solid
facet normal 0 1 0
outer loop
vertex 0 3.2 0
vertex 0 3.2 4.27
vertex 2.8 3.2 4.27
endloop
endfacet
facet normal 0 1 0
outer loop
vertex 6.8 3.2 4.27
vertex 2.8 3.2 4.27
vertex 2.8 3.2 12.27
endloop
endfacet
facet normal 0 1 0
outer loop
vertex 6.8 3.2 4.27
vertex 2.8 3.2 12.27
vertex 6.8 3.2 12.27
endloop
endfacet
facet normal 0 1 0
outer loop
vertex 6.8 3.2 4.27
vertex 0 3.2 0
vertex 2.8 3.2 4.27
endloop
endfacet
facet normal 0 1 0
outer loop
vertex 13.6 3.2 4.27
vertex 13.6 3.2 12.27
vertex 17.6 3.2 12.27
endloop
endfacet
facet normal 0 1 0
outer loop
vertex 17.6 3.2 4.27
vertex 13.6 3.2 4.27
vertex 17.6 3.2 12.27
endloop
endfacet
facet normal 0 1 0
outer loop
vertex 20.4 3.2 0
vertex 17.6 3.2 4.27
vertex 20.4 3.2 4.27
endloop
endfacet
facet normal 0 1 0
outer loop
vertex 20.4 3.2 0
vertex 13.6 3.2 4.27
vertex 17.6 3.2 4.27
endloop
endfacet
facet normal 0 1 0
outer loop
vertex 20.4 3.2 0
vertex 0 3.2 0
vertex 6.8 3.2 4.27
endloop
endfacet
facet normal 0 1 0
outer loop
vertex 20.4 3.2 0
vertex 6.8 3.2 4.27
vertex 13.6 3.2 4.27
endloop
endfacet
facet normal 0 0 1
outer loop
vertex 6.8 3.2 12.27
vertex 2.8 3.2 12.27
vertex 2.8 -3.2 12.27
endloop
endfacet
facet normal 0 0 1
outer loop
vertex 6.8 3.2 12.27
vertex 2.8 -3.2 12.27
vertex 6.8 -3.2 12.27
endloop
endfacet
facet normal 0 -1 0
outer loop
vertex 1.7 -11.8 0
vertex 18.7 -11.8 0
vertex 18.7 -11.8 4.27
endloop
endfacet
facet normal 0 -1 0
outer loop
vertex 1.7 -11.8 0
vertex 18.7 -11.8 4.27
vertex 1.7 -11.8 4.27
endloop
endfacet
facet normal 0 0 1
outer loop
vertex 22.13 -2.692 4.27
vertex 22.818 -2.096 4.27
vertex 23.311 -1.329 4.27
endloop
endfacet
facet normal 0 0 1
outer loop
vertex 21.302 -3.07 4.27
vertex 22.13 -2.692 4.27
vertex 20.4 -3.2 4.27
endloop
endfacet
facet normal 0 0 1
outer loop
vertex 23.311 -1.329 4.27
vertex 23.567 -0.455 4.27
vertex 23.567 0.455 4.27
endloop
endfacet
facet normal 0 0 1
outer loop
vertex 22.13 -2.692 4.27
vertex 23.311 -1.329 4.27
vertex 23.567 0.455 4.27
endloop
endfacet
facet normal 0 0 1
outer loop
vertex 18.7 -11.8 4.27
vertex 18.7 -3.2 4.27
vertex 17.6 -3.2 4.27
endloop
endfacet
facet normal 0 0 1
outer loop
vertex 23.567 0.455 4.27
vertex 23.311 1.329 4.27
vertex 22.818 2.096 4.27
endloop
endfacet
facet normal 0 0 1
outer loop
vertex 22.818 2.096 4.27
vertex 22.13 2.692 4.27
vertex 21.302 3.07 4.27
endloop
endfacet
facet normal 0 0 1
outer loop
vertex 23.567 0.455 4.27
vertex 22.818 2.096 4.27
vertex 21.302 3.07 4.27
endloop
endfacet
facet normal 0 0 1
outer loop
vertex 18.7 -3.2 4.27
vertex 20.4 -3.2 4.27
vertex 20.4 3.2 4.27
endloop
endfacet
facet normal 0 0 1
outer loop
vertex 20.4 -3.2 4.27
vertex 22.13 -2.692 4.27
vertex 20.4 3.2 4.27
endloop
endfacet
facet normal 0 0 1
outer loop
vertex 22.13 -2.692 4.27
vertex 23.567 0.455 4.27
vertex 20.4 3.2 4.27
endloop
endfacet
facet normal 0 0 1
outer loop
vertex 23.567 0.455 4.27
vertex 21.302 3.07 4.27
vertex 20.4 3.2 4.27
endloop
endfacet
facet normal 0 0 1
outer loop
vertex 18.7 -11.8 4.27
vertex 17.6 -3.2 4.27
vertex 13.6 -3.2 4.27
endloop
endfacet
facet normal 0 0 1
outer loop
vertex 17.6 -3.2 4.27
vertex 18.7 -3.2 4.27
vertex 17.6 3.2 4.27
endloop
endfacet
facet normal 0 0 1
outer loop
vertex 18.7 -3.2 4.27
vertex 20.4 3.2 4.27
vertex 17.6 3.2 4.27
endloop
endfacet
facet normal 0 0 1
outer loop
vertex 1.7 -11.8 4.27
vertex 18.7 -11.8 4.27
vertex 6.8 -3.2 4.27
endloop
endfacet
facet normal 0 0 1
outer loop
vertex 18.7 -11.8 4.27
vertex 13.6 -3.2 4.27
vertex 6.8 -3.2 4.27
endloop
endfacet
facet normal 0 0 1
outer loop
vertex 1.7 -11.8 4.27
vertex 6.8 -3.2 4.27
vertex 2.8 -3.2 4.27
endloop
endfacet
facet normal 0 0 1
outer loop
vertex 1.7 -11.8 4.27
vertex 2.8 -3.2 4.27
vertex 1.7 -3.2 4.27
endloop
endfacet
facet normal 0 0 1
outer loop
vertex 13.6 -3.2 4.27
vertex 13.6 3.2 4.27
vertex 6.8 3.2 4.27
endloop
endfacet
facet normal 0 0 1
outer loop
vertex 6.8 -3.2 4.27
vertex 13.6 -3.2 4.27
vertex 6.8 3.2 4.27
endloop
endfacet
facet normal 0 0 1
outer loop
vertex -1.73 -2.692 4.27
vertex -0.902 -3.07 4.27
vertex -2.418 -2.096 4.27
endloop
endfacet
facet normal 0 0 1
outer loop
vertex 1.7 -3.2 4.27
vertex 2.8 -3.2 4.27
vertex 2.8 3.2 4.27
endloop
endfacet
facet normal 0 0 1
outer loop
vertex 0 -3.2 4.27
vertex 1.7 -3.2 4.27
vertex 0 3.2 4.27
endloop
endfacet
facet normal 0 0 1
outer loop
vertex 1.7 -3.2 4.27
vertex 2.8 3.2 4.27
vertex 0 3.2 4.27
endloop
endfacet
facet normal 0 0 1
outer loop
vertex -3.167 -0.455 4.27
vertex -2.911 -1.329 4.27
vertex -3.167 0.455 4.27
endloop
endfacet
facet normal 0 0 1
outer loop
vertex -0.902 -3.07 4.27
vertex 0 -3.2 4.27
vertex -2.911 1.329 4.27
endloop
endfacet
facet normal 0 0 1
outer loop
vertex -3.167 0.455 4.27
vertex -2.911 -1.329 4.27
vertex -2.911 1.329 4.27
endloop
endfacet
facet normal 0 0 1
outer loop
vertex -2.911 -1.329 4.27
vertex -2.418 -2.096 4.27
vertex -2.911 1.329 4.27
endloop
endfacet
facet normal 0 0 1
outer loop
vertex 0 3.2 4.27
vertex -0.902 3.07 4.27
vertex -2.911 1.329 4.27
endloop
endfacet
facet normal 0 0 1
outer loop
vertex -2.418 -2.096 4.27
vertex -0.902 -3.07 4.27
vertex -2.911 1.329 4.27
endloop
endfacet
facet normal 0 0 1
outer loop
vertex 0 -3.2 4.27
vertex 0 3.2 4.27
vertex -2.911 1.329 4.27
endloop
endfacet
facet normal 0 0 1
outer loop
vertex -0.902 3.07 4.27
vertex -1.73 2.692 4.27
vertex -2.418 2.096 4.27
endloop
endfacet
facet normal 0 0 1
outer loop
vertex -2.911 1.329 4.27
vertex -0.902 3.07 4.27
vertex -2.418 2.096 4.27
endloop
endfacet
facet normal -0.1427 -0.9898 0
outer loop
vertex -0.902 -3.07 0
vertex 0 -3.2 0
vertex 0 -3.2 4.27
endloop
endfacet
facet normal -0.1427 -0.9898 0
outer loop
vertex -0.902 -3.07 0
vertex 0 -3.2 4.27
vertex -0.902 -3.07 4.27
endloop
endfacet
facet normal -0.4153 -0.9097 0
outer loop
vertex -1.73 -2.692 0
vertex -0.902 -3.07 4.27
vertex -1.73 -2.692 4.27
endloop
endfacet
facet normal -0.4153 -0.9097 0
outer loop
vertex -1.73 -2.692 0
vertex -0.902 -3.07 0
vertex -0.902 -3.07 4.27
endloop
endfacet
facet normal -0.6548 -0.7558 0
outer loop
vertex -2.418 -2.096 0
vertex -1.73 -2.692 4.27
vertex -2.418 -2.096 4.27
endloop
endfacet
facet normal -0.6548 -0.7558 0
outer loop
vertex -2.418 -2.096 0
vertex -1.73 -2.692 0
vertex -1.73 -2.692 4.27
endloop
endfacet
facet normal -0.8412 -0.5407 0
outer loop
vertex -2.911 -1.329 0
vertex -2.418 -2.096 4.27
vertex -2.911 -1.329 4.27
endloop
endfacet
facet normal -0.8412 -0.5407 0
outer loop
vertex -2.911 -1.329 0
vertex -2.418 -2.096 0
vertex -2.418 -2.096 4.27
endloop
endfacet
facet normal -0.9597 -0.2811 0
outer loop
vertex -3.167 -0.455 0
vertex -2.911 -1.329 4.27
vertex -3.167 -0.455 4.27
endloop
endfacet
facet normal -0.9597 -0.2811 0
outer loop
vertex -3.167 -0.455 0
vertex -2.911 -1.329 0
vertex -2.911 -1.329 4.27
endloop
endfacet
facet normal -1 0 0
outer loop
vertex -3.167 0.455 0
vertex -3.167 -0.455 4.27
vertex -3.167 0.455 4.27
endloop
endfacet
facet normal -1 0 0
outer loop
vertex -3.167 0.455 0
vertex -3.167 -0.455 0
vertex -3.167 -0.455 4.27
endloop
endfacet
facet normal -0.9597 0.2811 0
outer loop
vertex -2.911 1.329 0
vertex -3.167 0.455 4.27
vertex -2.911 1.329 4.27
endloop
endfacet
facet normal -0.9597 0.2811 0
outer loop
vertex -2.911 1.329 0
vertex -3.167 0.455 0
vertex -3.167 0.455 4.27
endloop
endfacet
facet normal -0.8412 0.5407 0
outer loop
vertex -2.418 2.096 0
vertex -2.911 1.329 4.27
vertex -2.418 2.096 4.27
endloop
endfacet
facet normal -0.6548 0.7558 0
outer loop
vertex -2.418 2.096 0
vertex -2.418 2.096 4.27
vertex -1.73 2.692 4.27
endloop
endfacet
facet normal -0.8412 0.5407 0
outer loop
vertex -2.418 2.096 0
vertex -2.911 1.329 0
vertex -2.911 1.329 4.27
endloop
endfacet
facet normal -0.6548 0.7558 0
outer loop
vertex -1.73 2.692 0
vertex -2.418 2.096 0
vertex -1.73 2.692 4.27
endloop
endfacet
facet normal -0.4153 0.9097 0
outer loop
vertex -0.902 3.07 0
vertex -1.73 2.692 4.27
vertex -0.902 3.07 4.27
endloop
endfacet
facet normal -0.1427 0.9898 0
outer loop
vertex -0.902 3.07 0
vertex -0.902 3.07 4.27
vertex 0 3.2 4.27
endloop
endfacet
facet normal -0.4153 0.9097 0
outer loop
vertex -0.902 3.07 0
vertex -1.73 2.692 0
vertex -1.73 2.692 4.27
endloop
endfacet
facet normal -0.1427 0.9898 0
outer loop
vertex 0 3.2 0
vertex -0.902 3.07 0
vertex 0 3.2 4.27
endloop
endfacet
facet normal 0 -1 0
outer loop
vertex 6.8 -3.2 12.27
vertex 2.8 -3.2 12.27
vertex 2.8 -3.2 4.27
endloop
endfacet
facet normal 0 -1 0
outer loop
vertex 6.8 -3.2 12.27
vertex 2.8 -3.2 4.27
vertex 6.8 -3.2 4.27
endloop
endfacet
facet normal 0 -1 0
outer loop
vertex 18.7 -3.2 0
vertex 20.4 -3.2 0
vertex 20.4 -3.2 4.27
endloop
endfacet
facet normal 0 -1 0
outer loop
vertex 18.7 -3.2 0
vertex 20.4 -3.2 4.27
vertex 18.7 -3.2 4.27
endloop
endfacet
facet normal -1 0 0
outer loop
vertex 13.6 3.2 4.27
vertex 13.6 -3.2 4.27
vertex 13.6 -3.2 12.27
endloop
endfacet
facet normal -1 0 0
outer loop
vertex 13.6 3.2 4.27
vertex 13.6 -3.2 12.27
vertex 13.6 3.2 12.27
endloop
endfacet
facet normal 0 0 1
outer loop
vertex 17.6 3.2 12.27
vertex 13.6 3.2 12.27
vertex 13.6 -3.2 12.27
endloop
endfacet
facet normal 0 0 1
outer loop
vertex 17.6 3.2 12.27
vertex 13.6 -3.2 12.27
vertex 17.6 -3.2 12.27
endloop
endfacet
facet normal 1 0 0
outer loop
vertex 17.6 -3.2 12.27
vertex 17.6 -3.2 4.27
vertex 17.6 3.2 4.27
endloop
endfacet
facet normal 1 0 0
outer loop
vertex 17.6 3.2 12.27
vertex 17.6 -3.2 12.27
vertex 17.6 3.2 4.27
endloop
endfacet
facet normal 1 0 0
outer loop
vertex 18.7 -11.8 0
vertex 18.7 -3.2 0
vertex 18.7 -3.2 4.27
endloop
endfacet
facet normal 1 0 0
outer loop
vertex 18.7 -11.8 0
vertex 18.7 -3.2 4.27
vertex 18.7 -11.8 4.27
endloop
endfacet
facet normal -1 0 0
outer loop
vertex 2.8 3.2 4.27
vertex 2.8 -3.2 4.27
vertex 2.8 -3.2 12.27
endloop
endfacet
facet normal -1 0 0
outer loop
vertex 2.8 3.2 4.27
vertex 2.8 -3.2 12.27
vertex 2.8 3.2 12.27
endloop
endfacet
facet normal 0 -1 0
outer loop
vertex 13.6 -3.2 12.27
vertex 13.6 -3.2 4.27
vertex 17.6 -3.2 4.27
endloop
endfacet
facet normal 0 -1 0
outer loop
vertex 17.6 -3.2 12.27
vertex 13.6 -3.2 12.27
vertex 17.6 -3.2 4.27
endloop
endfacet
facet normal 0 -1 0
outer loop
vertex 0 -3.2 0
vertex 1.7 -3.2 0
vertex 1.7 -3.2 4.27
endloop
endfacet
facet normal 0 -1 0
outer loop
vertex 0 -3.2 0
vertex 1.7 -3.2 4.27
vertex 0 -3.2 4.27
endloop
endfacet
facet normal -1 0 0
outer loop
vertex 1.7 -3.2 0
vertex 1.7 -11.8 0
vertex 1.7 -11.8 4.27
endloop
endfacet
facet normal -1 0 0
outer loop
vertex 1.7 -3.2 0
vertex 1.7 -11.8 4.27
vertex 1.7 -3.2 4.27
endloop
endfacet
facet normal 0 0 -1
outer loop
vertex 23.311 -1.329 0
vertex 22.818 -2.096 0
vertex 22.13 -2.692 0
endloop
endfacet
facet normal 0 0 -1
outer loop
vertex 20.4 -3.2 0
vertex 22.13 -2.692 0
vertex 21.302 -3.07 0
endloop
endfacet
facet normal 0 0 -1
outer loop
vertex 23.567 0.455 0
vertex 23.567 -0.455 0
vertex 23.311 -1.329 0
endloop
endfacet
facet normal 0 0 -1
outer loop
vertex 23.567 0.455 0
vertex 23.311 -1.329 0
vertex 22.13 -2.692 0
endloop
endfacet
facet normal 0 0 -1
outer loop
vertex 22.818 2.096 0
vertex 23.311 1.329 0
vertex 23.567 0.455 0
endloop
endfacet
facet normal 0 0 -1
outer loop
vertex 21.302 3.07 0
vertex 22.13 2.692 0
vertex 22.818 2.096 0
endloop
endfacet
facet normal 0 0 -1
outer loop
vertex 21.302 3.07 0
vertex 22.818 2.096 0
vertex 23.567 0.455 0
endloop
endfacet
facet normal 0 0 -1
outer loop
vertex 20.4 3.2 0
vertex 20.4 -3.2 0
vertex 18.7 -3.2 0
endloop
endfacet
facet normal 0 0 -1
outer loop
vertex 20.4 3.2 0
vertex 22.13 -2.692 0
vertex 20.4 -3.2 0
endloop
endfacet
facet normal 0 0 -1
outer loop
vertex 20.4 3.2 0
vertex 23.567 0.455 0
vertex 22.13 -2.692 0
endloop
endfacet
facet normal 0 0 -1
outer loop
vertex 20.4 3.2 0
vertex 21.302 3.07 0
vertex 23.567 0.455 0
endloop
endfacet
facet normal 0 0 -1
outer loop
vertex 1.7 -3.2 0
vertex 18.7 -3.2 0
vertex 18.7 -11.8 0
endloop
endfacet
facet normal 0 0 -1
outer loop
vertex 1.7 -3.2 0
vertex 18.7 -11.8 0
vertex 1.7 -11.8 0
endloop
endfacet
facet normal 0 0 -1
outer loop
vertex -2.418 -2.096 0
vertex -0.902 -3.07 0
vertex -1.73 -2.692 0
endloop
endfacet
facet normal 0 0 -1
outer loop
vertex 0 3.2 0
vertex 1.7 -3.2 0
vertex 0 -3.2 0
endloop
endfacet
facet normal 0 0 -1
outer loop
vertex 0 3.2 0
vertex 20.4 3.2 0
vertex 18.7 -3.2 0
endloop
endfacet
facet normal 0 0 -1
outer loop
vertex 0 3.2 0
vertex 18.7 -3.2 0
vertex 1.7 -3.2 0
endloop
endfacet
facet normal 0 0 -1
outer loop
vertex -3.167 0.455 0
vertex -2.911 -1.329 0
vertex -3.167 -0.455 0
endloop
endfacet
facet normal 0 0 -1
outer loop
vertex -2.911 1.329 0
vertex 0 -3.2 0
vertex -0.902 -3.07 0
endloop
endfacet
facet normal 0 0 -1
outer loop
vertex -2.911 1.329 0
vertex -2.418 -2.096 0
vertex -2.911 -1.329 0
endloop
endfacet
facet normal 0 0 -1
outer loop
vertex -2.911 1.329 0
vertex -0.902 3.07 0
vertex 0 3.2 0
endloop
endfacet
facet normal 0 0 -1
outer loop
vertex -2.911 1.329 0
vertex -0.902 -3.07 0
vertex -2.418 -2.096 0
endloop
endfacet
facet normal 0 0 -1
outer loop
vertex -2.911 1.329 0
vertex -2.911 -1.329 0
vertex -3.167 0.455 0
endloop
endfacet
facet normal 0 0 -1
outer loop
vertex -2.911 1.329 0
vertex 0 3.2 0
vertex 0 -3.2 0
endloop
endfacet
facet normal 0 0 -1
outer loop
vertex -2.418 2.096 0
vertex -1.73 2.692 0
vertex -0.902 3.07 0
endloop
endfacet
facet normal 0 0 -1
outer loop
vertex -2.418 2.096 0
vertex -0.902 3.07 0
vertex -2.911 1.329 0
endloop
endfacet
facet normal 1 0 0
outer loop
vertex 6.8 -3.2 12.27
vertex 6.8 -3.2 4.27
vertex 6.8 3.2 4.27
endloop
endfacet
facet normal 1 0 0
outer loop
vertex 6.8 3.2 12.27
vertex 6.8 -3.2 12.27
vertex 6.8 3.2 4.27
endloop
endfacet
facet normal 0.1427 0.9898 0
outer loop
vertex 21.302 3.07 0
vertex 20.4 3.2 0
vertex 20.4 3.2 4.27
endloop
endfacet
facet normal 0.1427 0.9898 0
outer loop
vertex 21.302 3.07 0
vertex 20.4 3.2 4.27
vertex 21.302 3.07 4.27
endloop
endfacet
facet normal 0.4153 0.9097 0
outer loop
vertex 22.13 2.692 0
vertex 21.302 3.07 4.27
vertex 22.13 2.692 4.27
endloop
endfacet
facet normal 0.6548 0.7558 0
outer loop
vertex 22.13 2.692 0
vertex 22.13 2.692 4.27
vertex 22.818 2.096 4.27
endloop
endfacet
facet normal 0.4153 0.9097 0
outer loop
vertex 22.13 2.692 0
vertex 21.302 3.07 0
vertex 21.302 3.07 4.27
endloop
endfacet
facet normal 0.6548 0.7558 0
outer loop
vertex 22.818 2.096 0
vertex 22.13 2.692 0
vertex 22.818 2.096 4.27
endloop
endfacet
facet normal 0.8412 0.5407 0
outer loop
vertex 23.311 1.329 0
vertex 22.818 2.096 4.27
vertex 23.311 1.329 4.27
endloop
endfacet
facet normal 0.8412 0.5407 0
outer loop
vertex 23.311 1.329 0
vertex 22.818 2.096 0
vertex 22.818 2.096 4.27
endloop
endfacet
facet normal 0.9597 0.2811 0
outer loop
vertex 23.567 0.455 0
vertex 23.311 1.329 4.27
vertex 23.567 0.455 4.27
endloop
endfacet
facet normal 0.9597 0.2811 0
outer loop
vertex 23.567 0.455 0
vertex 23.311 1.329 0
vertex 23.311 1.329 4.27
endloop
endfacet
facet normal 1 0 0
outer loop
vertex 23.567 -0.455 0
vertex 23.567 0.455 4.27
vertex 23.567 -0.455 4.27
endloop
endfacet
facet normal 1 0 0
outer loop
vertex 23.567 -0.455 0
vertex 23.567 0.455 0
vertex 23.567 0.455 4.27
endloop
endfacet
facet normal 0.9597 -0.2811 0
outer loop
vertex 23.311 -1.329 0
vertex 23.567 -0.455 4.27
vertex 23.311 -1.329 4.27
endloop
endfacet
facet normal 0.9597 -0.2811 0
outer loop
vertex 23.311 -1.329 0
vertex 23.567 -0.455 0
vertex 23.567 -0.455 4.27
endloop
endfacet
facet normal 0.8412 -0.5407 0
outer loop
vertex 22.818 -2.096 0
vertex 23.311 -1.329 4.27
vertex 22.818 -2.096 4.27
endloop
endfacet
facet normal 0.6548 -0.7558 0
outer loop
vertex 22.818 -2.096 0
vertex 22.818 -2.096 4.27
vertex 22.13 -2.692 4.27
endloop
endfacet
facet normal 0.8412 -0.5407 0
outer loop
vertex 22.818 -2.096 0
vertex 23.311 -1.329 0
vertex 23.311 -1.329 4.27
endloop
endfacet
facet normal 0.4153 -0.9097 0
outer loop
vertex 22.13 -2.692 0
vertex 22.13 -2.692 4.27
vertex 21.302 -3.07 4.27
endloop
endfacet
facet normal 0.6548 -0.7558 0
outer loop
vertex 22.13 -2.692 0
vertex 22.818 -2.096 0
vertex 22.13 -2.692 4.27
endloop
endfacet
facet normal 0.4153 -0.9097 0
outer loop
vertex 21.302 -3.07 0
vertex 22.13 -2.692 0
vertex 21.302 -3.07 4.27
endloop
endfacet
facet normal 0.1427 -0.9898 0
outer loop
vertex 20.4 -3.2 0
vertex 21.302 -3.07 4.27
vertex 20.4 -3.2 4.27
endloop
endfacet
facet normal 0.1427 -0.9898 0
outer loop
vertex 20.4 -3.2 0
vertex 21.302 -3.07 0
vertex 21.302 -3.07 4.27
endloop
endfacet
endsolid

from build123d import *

# Parameters (mm, degrees)
BOSS_EXTRUDE1_DEPTH = 4.27
SKETCH3_W           = 4
SKETCH3_H           = 6.4
BOSS_EXTRUDE2_DEPTH = 8


with BuildPart() as part:
    # Sketch2 → Boss-Extrude1 (new body)
    with BuildSketch(Plane.XY):
        with BuildLine():
            Line((0, 3.2), (20.4, 3.2))
            ThreePointArc((20.4, 3.2), (23.6, 0), (20.4, -3.2))
            Line((20.4, -3.2), (18.7, -3.2))
            Line((18.7, -3.2), (18.7, -11.8))
            Line((18.7, -11.8), (1.7, -11.8))
            Line((1.7, -11.8), (1.7, -3.2))
            Line((1.7, -3.2), (0, -3.2))
            ThreePointArc((0, -3.2), (-3.2, 0), (0, 3.2))
        make_face()
    extrude(amount=BOSS_EXTRUDE1_DEPTH)

    # Sketch3 → Boss-Extrude2 (add)
    with BuildSketch(Plane.XY.offset(4.27)):
        with Locations((4.8, 0)):
            Rectangle(SKETCH3_W, SKETCH3_H)
        with Locations((15.6, 0)):
            Rectangle(SKETCH3_W, SKETCH3_H)
    extrude(amount=BOSS_EXTRUDE2_DEPTH)


solid = part.part
